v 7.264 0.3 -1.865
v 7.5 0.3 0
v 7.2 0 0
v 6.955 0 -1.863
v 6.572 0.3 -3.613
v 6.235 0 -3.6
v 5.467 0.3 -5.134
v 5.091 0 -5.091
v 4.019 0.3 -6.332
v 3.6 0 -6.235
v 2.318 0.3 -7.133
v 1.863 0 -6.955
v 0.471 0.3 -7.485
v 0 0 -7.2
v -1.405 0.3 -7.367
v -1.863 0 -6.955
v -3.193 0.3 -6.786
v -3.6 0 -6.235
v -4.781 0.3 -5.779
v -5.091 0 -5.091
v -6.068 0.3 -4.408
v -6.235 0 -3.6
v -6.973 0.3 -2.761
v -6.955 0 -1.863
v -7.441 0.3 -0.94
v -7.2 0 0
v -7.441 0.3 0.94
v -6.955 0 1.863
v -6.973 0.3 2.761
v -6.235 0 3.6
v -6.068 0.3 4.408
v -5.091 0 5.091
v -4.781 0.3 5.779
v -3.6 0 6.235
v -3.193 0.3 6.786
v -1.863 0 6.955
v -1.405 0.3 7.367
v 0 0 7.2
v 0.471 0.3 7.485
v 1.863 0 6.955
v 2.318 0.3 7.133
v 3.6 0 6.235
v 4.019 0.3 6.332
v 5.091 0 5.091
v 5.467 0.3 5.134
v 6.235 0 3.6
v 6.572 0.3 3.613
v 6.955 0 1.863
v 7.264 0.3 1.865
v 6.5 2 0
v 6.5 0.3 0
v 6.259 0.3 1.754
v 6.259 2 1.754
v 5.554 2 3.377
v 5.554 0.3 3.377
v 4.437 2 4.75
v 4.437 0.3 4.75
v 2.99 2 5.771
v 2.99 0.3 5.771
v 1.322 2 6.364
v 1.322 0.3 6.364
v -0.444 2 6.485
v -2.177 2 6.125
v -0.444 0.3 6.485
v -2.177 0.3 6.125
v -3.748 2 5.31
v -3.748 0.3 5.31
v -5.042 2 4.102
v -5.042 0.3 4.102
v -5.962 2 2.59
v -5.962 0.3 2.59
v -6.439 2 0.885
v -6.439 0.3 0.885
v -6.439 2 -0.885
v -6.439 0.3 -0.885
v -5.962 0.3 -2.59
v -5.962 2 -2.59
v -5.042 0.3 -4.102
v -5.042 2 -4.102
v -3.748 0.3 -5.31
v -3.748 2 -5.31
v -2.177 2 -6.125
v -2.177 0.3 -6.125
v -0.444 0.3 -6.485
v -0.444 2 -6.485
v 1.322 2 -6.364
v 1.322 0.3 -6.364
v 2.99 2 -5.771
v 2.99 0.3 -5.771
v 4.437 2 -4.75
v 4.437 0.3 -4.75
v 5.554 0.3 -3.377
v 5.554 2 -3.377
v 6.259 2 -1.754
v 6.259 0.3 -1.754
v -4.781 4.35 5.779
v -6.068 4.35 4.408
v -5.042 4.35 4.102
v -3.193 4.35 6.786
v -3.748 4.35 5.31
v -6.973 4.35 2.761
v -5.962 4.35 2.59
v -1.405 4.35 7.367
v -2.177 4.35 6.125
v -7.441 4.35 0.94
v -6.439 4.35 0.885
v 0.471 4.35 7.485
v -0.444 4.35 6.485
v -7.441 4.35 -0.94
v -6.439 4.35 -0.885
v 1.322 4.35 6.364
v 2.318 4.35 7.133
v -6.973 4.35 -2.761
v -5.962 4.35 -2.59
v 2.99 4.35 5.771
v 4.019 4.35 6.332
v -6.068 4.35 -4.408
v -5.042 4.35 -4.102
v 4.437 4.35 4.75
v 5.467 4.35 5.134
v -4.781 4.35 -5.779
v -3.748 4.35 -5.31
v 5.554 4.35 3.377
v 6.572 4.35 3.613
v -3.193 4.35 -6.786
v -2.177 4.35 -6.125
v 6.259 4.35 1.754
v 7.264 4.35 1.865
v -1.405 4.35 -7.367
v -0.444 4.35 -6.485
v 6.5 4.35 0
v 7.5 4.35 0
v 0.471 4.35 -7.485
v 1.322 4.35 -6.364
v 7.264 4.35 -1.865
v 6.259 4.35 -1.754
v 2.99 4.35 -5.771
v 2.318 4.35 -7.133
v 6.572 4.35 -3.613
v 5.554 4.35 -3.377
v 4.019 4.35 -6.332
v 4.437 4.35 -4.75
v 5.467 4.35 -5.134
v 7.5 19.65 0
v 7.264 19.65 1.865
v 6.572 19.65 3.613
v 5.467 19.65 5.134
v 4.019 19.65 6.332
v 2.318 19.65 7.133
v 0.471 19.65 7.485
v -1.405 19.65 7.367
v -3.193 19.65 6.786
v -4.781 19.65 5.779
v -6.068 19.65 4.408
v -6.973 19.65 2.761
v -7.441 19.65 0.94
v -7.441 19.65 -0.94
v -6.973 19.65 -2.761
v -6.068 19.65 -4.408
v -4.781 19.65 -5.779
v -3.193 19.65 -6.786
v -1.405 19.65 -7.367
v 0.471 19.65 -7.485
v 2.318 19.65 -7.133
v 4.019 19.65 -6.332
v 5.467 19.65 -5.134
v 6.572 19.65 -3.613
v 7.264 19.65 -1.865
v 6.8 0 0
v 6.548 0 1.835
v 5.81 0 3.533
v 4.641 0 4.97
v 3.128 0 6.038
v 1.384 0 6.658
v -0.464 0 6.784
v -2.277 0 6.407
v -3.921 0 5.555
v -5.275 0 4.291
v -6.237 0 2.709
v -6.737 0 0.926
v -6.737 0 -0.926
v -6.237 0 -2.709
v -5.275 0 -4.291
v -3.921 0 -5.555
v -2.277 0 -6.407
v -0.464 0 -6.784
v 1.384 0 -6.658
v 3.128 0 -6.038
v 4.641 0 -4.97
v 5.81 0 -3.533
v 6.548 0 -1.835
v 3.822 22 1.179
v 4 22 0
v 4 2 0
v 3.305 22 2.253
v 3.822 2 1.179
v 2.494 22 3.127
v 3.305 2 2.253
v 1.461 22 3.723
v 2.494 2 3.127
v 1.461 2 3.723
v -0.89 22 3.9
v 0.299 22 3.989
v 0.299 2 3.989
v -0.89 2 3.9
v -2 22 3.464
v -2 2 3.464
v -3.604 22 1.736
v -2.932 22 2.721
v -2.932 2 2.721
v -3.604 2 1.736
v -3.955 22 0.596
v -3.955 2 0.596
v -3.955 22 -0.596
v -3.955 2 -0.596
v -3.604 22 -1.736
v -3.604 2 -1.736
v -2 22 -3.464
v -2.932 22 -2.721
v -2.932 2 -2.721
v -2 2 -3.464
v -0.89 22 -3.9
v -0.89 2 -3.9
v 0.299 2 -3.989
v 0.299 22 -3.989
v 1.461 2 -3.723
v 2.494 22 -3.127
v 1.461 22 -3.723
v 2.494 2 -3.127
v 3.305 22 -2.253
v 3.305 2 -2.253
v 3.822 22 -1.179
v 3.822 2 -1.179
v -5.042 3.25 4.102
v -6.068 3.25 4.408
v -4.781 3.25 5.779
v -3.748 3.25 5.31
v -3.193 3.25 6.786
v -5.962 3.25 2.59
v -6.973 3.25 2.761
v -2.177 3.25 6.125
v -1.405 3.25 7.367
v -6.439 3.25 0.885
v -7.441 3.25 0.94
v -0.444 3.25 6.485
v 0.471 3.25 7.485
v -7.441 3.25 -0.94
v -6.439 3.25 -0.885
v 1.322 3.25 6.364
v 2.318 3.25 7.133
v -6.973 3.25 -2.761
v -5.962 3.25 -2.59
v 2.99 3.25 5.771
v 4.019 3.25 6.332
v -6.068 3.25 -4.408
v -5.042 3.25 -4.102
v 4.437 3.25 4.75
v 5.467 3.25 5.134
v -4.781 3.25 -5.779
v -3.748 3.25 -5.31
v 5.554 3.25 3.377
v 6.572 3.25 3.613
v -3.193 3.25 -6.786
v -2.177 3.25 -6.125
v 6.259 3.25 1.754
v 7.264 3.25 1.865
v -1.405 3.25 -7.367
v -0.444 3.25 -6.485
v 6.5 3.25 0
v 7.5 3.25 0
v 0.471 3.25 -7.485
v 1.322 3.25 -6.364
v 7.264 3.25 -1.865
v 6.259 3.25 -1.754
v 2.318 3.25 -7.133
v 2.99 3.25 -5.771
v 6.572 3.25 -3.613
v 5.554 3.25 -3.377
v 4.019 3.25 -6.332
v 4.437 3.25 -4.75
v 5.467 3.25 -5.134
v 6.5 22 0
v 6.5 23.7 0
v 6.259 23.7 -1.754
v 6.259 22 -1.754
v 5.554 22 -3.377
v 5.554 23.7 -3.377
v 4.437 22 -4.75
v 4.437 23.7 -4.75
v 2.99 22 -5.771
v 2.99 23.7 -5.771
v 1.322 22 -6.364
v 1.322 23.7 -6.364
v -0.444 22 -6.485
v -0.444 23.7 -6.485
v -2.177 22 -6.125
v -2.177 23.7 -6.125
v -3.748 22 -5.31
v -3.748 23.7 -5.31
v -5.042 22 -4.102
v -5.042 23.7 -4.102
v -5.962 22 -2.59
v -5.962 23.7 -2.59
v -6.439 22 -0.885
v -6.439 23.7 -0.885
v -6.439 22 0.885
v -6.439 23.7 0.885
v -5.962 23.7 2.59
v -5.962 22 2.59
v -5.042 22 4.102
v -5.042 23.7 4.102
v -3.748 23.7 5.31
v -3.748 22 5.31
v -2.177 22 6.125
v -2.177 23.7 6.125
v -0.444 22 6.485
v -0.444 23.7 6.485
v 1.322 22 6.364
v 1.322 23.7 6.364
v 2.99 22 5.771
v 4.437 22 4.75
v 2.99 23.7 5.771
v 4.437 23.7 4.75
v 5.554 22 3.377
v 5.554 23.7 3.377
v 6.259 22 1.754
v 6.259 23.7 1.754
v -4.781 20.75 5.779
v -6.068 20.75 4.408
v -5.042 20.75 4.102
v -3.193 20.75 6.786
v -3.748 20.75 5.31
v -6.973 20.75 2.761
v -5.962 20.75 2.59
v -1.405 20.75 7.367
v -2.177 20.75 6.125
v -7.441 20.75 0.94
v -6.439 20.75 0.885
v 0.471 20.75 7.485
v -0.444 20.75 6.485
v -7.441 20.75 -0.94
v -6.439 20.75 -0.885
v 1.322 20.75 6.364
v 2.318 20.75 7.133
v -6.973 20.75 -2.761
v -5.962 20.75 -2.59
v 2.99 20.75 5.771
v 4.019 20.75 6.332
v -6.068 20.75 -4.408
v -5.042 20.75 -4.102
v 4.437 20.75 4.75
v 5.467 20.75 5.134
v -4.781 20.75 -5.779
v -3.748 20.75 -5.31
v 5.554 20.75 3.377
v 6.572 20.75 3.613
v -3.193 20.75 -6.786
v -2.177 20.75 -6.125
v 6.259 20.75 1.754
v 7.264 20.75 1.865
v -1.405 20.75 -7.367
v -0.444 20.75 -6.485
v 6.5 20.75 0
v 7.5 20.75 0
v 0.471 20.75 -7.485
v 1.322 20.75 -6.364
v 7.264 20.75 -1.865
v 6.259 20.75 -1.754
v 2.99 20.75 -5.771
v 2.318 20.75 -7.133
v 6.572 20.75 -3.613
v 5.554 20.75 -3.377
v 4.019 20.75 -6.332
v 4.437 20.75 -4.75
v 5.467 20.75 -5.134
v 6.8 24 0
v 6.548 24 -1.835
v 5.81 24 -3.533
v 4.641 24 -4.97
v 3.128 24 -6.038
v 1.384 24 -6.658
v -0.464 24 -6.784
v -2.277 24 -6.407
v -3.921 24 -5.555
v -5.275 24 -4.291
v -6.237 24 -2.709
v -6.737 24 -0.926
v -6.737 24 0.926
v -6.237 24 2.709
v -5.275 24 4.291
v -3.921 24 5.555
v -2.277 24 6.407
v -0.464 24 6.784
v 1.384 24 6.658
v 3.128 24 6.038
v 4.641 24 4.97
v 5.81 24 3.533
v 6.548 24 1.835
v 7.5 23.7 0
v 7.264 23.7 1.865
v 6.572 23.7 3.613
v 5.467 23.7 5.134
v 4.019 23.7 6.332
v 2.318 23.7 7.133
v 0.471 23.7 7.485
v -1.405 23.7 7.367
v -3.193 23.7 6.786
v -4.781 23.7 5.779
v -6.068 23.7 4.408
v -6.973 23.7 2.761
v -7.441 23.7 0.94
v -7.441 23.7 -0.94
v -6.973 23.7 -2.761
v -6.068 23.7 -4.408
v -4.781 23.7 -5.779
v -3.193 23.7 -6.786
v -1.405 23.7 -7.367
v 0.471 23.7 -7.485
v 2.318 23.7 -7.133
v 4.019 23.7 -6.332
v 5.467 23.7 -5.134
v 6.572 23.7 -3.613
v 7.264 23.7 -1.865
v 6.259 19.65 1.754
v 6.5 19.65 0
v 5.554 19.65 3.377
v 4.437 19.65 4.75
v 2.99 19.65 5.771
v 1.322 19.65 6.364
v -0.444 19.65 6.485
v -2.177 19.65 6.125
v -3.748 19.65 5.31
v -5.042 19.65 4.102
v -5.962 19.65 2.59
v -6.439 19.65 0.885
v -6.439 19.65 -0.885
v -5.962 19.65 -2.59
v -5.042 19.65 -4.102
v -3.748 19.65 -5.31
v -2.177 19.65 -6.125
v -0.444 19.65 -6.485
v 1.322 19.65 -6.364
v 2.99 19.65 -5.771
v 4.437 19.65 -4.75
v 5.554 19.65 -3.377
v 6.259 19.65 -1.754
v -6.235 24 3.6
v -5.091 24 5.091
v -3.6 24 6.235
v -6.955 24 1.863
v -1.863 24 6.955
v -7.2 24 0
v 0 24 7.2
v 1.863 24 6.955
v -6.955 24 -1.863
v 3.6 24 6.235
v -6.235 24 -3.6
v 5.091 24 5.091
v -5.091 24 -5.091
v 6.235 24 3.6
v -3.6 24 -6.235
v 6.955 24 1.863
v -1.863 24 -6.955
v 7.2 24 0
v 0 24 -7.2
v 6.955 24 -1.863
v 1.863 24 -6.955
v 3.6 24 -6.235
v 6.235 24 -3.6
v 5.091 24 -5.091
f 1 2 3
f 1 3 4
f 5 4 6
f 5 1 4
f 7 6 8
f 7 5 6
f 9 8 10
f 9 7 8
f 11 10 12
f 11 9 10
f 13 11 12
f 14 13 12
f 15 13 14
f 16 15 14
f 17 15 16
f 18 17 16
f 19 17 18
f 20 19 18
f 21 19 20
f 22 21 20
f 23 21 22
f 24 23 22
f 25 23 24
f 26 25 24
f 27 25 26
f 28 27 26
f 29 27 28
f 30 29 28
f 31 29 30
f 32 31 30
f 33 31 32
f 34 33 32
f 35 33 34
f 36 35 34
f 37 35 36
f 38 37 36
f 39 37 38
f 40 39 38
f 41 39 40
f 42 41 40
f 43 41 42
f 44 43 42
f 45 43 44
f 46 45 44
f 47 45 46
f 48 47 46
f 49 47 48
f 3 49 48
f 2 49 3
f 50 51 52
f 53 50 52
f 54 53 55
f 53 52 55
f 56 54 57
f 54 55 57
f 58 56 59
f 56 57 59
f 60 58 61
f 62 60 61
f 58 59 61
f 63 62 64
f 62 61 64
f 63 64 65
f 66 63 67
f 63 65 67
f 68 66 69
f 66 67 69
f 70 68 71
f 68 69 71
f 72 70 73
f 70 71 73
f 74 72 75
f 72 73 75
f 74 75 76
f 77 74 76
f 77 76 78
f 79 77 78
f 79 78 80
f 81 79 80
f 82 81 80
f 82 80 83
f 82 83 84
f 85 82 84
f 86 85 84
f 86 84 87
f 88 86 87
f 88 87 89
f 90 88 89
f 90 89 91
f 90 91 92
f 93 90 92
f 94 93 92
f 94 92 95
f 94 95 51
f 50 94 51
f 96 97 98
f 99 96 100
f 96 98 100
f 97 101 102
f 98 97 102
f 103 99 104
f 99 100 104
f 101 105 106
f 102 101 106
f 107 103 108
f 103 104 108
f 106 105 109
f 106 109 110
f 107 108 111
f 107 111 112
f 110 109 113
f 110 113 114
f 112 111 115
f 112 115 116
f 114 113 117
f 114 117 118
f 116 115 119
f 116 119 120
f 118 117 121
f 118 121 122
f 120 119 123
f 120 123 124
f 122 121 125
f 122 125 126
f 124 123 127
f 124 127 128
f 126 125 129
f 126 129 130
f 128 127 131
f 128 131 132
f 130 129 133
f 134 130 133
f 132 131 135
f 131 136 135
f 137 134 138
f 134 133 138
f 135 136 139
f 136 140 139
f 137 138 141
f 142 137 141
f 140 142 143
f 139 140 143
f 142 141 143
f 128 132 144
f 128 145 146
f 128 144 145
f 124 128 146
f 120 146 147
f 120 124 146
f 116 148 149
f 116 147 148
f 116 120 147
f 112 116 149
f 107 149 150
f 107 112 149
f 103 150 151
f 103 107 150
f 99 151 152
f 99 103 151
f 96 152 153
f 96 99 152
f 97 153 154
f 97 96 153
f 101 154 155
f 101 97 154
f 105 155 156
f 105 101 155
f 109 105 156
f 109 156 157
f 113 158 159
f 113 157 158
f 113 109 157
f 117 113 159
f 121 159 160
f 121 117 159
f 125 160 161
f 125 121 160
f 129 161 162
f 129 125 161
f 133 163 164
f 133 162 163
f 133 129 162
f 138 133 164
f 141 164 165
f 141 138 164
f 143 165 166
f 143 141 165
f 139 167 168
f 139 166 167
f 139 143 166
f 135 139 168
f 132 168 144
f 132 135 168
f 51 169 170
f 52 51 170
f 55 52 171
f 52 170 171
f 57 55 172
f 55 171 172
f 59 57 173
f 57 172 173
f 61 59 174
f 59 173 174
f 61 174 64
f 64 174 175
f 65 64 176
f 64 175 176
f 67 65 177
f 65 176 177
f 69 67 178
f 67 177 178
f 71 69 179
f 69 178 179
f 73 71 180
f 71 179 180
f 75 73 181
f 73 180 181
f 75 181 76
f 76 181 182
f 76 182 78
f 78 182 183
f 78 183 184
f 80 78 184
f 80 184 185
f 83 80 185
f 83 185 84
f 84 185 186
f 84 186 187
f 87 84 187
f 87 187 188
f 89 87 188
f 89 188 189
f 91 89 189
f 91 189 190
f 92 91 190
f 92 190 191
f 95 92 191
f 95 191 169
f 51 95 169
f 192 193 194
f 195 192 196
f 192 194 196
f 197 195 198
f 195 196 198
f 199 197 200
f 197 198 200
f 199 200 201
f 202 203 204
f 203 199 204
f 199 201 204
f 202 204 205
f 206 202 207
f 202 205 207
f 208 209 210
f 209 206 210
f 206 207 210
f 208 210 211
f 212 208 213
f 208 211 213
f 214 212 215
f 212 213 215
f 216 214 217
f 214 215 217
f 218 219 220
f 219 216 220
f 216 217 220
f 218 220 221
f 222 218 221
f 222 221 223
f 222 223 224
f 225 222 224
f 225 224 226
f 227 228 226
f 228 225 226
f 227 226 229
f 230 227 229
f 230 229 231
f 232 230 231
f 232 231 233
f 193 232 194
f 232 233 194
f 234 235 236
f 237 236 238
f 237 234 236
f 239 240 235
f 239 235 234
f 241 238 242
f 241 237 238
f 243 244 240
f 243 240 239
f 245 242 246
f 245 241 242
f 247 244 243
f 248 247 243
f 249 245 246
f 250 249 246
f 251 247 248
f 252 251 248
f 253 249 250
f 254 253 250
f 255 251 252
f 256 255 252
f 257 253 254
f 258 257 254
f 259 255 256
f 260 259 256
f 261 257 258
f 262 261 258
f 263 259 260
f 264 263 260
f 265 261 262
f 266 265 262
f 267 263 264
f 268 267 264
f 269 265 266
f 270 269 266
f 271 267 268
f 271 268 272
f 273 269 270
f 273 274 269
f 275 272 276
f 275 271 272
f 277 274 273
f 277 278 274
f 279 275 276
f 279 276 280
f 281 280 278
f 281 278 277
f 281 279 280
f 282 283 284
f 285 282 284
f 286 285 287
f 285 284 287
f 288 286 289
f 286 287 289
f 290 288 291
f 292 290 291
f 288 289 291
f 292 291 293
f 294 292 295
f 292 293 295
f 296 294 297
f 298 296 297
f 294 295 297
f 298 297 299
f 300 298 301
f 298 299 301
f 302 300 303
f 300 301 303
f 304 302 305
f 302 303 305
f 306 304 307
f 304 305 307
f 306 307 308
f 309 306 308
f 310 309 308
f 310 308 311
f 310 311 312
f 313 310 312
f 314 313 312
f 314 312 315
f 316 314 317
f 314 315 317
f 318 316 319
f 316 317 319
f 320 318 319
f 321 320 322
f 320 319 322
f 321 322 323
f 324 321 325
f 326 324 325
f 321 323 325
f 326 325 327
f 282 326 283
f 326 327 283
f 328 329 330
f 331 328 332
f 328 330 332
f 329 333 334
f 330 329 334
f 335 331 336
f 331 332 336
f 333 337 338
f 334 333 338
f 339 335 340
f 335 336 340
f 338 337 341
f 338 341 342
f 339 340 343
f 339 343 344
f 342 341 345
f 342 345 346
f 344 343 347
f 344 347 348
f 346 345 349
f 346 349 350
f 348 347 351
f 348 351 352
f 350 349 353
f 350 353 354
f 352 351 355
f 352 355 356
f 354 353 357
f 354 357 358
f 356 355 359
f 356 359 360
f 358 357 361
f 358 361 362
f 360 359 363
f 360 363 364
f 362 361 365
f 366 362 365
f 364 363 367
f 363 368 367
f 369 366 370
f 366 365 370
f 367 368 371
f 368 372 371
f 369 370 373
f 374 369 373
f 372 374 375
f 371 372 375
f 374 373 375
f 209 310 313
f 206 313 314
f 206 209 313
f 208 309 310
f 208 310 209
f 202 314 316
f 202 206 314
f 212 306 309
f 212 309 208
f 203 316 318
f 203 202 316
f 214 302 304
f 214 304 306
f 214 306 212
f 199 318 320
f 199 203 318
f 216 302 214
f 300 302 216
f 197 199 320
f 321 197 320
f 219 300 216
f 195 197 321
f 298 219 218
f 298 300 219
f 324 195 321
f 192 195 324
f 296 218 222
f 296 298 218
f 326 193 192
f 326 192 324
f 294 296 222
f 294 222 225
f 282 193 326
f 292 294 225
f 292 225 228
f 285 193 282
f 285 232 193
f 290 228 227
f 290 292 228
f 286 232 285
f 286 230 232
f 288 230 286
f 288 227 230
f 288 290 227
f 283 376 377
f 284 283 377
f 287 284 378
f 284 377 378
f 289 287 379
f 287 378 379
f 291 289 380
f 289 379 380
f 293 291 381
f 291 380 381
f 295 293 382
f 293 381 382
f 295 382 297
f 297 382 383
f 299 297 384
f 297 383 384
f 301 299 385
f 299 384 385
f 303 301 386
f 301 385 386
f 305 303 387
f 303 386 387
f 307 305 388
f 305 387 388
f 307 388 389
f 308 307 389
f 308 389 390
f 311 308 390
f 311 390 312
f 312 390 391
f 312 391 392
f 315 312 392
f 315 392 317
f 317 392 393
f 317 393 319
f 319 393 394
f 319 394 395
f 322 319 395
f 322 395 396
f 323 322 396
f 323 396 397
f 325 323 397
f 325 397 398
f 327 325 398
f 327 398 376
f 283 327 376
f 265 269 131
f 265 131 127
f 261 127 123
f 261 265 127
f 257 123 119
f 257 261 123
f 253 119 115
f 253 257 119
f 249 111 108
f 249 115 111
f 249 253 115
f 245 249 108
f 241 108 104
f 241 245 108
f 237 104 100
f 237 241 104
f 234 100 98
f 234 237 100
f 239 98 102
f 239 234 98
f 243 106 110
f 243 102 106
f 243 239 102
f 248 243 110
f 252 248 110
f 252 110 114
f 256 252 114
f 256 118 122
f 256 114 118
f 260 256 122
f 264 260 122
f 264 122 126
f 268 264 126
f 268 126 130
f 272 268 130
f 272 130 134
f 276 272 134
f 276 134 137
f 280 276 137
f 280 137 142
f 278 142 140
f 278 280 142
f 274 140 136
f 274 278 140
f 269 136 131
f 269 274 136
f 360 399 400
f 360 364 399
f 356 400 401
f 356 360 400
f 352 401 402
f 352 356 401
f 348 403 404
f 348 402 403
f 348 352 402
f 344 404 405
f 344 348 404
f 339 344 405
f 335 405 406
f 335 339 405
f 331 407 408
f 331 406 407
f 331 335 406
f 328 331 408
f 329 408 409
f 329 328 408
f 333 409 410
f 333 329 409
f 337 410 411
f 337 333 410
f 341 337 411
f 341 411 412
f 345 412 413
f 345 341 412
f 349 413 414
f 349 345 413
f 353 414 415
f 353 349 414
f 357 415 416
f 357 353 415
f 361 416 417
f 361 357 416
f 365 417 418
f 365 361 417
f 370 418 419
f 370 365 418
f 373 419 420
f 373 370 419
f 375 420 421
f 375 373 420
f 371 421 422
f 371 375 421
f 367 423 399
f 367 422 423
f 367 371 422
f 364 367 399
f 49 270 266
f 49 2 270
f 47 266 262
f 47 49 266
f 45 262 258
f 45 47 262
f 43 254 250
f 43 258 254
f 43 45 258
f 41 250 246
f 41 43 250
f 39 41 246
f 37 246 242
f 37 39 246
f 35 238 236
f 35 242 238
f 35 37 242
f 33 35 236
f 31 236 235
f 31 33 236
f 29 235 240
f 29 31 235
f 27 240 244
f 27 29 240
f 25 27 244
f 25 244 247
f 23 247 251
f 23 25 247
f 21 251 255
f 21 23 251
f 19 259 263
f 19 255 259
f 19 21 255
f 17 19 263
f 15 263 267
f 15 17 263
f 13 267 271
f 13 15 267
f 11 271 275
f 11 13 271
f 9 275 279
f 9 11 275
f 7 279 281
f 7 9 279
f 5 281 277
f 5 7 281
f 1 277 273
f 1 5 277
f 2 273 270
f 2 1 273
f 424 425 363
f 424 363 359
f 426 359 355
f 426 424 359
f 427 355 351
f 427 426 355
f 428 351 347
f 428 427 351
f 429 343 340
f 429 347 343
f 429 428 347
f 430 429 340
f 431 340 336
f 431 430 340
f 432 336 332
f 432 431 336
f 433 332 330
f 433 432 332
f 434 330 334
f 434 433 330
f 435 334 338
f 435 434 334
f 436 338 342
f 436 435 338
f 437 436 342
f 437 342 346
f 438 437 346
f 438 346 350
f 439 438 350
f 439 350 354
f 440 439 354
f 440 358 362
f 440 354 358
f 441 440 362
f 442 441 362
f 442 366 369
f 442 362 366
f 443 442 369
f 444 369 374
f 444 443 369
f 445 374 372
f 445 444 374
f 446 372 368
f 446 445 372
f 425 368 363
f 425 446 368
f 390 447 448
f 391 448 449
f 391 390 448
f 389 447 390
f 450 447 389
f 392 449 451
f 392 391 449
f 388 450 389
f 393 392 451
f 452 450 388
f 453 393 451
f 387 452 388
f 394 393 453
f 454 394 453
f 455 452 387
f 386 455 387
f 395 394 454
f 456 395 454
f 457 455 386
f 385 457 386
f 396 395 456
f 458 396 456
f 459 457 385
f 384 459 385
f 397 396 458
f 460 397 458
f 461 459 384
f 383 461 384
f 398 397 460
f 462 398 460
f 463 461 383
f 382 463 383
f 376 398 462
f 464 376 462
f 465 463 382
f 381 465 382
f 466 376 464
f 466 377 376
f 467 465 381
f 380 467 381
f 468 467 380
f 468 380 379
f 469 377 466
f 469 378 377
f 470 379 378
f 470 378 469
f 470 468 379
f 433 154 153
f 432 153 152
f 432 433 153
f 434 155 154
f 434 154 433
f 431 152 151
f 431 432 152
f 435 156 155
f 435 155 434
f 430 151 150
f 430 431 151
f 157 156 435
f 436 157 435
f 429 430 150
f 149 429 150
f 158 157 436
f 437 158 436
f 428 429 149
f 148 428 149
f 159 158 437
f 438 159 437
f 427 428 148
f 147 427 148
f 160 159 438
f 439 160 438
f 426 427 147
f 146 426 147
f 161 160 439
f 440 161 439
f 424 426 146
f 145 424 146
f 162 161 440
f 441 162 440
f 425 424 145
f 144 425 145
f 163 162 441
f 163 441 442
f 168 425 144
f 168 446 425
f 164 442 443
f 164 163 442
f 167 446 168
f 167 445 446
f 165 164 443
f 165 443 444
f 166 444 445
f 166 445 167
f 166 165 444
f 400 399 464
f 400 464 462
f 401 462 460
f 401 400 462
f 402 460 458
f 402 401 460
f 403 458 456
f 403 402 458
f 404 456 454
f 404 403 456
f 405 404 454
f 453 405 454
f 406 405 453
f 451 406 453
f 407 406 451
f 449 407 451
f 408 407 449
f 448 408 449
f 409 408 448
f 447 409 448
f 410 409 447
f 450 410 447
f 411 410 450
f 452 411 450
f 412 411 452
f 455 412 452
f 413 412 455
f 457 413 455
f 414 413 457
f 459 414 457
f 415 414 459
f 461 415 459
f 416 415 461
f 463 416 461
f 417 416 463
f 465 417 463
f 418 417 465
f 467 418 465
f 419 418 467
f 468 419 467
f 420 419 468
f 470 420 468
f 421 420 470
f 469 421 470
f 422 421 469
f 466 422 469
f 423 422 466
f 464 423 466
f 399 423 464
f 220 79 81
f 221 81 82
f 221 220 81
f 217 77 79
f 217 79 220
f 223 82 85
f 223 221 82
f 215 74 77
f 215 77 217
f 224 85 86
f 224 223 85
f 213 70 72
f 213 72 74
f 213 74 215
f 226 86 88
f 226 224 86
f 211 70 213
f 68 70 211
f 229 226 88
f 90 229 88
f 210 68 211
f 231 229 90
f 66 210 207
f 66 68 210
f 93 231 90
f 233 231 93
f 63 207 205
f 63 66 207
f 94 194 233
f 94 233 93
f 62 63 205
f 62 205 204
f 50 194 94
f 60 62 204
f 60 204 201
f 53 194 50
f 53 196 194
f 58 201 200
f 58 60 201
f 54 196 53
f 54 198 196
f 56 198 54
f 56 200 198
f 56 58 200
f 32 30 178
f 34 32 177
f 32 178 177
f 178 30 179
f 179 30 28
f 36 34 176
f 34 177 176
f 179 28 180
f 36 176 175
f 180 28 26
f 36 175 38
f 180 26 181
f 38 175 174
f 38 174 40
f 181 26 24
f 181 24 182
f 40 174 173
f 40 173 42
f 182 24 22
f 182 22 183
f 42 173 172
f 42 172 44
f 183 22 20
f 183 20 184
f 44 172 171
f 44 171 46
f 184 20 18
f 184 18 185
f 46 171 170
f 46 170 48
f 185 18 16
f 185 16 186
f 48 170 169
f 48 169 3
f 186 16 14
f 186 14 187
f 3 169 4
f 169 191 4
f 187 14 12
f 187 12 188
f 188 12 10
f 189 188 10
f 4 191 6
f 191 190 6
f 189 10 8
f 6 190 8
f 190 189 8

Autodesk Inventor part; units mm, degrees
ref_plane "YZ Plane" through (0, 0, 0) normal (1, 0, 0) x (0, 1, 0)
ref_plane "XZ Plane" through (0, 0, 0) normal (0, 1, 0) x (-1, 0, 0)
ref_plane "XY Plane" through (0, 0, 0) normal (0, 0, 1) x (1, 0, 0)
sketch "Эскиз1" plane through (0, 0, 0) normal (0, 0, 1) x (1, 0, 0)
  line L0 (0, 0) -> (0, 24) construction
  line L1 (0, 24) -> (4, 24) construction
  line L2 (4, 24) -> (4, 0)
  line L3 (4, 24) -> (7.5, 24)
  line L4 (7.5, 24) -> (7.5, 20.75)
  line L5 (7.5, 20.75) -> (6.5, 20.75)
  line L6 (6.5, 20.75) -> (6.5, 19.65)
  line L7 (6.5, 19.65) -> (7.5, 19.65)
  line L8 (7.5, 19.65) -> (7.5, 4.35)
  line L9 (7.5, 4.35) -> (6.5, 4.35)
  line L10 (6.5, 4.35) -> (6.5, 3.25)
  line L11 (6.5, 3.25) -> (7.5, 3.25)
  line L12 (7.5, 3.25) -> (7.5, 0)
  line L13 (7.5, 0) -> (4, 0)
  dimension "d0" = 24
  dimension "d1" = 4
  dimension "d3" = 3.5
  dimension "d4" = 3.25
  dimension "d5" = 1
  dimension "d6" = 1.1
  dimension "d7" = 15.3
  dimension "d8" = 1
  dimension "d9" = 1.1
revolve "Вращение1" add sketch "Эскиз1" angle 360 about axis through (0, 0, 0) along (0, 1, 0)
chamfer "Фаска1" distance 0.3 angle 45 2 edges at (-7.5, 24, 0) (-7.5, 0, 0)
sketch "Эскиз2" plane through (0, 24, 0) normal (0, 1, 0) x (1, 0, 0)
  circle A0 centre (0, 0) radius 4 projected
  circle A1 centre (0, 0) radius 7.2 projected
  circle A2 centre (0, 0) radius 6.5
  dimension "d14" = 13
extrude "Выдавливание1" cut sketch "Эскиз2" against normal blind 2 contours A2
chamfer "Фаска2" distance 0.3 angle 45 1 edges at (-6.5, 24, 0)
sketch "Эскиз4" plane through (0, 0, 0) normal (0, -1, 0) x (1, 0, 0)
  circle A0 centre (0, 0) radius 4 projected
  circle A1 centre (0, 0) radius 7.2 projected
  circle A2 centre (0, 0) radius 6.5
  dimension "d27" = 13
extrude "Выдавливание3" cut sketch "Эскиз4" against normal blind 2 contours A2
chamfer "Фаска4" distance 0.3 angle 45 1 edges at (-6.5, 0, 0)
properties part number "bearing"
